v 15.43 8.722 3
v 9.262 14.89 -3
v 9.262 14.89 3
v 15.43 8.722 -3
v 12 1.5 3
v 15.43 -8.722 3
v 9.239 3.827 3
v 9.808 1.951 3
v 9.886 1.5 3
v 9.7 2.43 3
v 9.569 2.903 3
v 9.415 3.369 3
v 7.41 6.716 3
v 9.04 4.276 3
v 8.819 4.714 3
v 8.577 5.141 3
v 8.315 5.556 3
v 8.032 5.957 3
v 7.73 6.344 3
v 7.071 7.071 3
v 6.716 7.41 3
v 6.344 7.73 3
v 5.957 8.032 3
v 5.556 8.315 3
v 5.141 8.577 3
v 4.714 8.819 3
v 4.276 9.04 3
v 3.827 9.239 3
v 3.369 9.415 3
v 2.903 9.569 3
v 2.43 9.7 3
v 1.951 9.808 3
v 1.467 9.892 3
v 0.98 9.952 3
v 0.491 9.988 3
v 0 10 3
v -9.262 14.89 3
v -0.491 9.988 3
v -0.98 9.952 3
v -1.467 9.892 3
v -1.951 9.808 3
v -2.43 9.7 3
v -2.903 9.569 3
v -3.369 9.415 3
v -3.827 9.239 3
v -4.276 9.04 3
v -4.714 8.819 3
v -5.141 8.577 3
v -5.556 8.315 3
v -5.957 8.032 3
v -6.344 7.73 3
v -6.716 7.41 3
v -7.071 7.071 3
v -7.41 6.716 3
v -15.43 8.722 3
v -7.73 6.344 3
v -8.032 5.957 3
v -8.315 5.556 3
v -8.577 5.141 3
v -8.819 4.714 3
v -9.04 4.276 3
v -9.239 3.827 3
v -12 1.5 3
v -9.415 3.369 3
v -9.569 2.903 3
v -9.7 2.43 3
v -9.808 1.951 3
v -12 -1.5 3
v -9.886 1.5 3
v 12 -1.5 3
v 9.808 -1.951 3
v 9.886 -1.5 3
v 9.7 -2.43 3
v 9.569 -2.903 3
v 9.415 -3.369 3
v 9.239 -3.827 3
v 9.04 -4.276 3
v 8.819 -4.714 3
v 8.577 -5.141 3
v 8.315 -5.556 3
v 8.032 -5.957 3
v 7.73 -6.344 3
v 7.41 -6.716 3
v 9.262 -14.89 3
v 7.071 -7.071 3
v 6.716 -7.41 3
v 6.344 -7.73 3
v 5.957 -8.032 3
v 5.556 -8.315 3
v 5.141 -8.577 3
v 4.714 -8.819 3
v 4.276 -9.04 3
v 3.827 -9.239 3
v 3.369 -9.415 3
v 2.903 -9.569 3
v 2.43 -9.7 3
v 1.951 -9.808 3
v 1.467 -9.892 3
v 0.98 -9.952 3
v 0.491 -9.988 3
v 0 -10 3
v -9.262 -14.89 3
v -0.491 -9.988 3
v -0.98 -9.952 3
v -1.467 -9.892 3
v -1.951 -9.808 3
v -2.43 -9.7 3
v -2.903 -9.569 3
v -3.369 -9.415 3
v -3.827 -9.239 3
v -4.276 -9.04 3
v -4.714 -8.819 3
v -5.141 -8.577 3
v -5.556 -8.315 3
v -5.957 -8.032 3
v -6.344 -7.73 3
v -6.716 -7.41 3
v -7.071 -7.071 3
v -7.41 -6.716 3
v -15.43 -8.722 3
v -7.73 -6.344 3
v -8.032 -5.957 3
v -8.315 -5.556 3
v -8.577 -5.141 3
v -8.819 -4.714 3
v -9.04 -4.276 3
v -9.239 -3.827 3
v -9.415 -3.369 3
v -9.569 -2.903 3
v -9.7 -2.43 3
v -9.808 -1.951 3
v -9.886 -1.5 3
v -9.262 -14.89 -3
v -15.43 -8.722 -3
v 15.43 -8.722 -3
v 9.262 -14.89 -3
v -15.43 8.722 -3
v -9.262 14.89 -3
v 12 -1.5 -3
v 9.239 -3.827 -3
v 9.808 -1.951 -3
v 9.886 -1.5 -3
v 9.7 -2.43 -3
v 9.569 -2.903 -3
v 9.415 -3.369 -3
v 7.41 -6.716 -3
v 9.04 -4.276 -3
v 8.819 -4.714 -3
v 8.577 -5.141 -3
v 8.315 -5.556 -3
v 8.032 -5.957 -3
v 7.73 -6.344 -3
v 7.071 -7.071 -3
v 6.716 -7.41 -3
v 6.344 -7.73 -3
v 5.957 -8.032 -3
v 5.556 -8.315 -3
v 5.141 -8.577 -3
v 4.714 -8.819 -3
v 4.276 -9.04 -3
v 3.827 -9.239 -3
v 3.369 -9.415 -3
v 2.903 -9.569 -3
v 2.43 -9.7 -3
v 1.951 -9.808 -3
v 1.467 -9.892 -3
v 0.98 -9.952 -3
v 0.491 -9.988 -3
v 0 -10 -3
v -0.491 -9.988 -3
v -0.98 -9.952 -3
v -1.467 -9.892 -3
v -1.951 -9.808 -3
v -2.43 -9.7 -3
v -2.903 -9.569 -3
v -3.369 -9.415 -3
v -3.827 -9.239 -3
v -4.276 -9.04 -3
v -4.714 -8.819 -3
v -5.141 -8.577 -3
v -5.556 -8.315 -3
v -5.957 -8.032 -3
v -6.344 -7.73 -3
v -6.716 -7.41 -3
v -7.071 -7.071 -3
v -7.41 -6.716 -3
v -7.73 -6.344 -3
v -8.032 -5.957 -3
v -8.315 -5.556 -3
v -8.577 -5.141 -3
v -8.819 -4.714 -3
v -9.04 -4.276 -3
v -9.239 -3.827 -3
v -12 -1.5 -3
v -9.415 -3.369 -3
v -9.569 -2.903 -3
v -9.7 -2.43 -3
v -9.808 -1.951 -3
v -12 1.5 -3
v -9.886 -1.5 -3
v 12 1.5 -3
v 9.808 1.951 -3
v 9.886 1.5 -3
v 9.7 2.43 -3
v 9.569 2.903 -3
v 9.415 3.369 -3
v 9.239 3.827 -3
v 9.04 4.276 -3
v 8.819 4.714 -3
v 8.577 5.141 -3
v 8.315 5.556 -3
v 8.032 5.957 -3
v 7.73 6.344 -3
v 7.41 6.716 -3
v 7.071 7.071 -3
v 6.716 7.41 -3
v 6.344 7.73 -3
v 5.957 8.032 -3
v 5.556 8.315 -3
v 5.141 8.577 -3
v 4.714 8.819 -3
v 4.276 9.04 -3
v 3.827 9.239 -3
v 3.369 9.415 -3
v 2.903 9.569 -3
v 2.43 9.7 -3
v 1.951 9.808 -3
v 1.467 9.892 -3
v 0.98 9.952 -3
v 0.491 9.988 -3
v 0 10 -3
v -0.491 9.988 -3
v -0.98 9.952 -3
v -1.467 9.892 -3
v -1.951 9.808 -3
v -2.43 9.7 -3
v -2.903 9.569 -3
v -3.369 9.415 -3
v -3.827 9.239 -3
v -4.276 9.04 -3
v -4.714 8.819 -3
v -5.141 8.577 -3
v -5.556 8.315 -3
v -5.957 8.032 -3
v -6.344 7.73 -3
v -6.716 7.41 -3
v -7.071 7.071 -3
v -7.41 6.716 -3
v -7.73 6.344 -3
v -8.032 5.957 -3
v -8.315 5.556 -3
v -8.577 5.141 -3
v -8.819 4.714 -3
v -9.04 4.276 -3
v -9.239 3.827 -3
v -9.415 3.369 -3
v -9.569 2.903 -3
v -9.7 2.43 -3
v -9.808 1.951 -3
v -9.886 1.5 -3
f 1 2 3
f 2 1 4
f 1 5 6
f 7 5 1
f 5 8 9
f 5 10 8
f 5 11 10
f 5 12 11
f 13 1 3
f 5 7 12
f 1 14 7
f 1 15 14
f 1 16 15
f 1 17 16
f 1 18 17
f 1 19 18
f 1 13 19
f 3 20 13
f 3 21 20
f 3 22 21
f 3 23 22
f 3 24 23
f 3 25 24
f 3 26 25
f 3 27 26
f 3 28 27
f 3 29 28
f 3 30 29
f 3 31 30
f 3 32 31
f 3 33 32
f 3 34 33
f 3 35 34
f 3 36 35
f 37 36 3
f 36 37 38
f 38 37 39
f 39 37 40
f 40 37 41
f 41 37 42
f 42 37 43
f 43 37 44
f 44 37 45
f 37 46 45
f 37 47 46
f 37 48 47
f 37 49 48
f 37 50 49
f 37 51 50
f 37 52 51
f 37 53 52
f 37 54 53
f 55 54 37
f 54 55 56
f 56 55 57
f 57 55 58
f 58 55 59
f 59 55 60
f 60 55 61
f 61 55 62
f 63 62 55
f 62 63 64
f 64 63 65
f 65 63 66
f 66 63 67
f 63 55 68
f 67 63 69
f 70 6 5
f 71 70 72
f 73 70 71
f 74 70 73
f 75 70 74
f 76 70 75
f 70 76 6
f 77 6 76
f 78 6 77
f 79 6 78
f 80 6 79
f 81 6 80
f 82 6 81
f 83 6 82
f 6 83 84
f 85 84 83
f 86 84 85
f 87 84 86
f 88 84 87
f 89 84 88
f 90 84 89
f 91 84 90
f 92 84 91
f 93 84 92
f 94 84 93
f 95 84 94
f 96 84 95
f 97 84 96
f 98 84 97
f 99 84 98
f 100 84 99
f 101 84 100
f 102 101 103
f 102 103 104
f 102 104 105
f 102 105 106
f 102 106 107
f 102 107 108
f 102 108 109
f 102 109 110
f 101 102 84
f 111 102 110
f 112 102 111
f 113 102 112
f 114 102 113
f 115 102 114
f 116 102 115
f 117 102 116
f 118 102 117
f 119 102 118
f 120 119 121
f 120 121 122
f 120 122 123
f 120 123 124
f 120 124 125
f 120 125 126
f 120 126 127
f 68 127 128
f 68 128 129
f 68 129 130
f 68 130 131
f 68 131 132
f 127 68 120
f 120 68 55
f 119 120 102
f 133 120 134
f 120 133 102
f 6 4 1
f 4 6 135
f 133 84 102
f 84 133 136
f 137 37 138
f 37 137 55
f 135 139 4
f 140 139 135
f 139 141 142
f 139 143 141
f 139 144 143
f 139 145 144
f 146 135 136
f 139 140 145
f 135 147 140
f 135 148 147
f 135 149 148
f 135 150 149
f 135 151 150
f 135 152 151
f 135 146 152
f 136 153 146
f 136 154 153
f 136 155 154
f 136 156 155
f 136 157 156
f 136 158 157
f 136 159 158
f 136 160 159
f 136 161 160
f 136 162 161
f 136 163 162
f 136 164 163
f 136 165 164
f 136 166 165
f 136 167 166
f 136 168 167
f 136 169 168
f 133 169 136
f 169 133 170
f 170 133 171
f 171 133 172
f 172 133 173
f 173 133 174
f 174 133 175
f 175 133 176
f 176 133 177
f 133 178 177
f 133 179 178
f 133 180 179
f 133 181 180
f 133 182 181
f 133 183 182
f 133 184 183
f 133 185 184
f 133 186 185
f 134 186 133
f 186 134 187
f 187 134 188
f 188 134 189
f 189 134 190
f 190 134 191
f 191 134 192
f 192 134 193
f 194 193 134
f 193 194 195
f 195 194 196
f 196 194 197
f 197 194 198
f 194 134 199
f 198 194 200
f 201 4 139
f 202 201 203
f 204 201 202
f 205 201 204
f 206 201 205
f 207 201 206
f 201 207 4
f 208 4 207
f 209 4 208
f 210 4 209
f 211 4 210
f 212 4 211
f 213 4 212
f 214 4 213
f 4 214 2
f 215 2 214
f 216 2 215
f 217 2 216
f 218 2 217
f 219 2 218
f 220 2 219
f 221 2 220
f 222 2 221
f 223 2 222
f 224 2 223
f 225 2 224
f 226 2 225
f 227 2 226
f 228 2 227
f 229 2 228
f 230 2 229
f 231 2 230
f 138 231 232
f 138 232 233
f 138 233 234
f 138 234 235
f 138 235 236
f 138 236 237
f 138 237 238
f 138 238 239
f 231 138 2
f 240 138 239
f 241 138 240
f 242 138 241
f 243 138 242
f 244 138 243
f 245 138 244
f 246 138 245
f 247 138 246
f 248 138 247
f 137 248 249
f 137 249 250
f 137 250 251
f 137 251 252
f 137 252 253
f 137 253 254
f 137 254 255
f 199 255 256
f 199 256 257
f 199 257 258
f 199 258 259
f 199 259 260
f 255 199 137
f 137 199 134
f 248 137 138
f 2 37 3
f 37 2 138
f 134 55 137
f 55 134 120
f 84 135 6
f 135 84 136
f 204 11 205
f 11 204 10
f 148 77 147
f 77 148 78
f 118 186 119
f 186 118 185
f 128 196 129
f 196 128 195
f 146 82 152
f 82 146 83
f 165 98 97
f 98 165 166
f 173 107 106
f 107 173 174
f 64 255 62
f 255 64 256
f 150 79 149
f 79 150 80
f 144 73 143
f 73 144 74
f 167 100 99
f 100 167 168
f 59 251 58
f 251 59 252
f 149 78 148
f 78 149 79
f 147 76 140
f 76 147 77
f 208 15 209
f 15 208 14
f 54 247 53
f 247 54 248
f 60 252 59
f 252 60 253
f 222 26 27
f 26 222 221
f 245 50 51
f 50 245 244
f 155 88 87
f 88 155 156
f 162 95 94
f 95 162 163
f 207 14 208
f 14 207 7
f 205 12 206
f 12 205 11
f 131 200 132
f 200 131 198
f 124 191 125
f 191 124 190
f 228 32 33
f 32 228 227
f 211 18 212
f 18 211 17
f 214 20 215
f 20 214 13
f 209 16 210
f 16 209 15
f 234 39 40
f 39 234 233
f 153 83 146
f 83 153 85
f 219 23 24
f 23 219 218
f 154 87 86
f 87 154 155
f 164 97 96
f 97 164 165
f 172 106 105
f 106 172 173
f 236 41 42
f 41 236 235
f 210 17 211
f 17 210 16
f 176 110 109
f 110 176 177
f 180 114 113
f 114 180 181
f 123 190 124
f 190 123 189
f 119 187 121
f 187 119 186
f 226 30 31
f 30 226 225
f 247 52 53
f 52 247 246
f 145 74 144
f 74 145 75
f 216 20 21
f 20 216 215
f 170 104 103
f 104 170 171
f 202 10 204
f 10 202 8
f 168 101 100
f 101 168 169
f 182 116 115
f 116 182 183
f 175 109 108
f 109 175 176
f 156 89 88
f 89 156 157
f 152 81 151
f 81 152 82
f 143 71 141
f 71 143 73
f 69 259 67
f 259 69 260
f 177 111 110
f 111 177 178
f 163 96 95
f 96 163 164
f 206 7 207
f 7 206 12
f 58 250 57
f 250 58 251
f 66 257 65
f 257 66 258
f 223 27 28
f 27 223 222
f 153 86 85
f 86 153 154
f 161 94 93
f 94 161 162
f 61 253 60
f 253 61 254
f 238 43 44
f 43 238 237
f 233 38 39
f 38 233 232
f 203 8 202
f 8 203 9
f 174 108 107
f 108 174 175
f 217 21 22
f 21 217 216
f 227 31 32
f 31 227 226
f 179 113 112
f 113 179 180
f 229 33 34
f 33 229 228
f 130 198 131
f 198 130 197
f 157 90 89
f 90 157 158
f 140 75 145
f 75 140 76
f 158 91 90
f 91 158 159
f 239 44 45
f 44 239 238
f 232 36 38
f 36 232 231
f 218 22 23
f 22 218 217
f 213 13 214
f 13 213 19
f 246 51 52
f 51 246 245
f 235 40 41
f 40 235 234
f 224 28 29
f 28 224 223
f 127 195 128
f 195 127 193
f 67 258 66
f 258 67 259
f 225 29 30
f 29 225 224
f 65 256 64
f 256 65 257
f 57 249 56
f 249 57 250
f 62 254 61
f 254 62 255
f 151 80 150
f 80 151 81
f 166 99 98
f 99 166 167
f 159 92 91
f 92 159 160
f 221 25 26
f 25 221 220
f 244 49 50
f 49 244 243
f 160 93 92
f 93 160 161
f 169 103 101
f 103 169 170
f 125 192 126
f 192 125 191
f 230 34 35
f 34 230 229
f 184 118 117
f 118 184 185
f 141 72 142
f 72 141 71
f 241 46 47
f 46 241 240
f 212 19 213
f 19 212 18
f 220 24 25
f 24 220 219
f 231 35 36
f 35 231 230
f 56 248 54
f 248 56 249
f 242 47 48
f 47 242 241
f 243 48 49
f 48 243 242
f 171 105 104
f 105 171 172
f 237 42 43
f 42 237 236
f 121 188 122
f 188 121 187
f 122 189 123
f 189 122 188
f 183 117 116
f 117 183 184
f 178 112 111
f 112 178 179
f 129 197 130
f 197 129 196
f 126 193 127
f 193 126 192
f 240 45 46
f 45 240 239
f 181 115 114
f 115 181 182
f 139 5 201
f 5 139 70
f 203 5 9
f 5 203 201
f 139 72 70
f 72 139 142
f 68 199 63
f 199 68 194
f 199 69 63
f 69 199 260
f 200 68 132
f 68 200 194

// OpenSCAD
$fn = 128;

// Target bounding box (approx): 29.8 x 30.9 x 6.0 mm
bbox_X = 30.86;
bbox_Y = 29.78;
bbox_Z = 6.0;

ring_thickness = bbox_Z;

// Outer octagon (nut-like) - true octagon with flats aligned to X/Y
outer_flat_to_flat_X = bbox_X;
outer_flat_to_flat_Y = bbox_Y;

// Inner bore + keyways (two opposing, left-right)
bore_d = 20;
keyway_w = 3;                 // tangential width (Y)
keyway_depth_radial = 2;      // radial depth outward from bore
keyway_len_axial = bbox_Z;    // through full thickness

// Pins/tabs (two small cylinders) on +Z face near +X edge
pin_d = 2;
pin_h = 1.2;                  // protrusion beyond 6mm plate
pin_edge_offset = 2;          // from outer edge toward center
pin_spacing = 6;              // center-to-center in Y

// Robust boolean overlap / connectivity overlap
overlap = 1.2;                // 1-2mm overlap for solid connections

// ---------- Helpers ----------
function oct_points_from_flats(fx, fy) =
    let(a = fx/2, b = fy/2,
        // corner cut so resulting polygon is an octagon with flats on X/Y
        c = min(a, b) * (sqrt(2) - 1))
    [
      [ a - c,  b],
      [ a,      b - c],
      [ a,     -b + c],
      [ a - c, -b],
      [-a + c, -b],
      [-a,     -b + c],
      [-a,      b - c],
      [-a + c,  b]
    ];

module outer_oct_prism(h){
  linear_extrude(height=h, center=true)
    polygon(points=oct_points_from_flats(outer_flat_to_flat_X, outer_flat_to_flat_Y));
}

module bore_cut(){
  cylinder(d=bore_d, h=ring_thickness + 2*overlap, center=true);
}

module keyway_cut(sign=1){
  // Two opposing rectangular notches opening into the bore, oriented along X (left-right)
  // Start slightly inside bore and extend outward; ensure full-through cut.
  x_center = sign * (bore_d/2 + keyway_depth_radial/2 - overlap/2);
  translate([x_center, 0, 0])
    cube([keyway_depth_radial + overlap, keyway_w, keyway_len_axial + 2*overlap], center=true);
}

module pins(){
  // Two small cylindrical pins protruding from ONLY the +Z face near the +X outer edge.
  // Ensure they intersect the ring by `overlap` for a single connected solid.
  x_pin = outer_flat_to_flat_X/2 - pin_edge_offset - pin_d/2;

  // Place so the pin bottom is embedded into the ring by `overlap`
  // ring top surface is at +ring_thickness/2
  // pin bottom = z_pin - pin_h/2 = ring_thickness/2 - overlap
  z_pin = ring_thickness/2 - overlap + pin_h/2;

  union(){
    translate([x_pin,  pin_spacing/2, z_pin]) cylinder(d=pin_d, h=pin_h, center=true);
    translate([x_pin, -pin_spacing/2, z_pin]) cylinder(d=pin_d, h=pin_h, center=true);
  }
}

// ---------- Model ----------
module ring_body(){
  difference(){
    outer_oct_prism(ring_thickness);
    bore_cut();
    keyway_cut( 1);
    keyway_cut(-1);
  }
}

// Single connected solid
union(){
  ring_body();
  pins();
}
